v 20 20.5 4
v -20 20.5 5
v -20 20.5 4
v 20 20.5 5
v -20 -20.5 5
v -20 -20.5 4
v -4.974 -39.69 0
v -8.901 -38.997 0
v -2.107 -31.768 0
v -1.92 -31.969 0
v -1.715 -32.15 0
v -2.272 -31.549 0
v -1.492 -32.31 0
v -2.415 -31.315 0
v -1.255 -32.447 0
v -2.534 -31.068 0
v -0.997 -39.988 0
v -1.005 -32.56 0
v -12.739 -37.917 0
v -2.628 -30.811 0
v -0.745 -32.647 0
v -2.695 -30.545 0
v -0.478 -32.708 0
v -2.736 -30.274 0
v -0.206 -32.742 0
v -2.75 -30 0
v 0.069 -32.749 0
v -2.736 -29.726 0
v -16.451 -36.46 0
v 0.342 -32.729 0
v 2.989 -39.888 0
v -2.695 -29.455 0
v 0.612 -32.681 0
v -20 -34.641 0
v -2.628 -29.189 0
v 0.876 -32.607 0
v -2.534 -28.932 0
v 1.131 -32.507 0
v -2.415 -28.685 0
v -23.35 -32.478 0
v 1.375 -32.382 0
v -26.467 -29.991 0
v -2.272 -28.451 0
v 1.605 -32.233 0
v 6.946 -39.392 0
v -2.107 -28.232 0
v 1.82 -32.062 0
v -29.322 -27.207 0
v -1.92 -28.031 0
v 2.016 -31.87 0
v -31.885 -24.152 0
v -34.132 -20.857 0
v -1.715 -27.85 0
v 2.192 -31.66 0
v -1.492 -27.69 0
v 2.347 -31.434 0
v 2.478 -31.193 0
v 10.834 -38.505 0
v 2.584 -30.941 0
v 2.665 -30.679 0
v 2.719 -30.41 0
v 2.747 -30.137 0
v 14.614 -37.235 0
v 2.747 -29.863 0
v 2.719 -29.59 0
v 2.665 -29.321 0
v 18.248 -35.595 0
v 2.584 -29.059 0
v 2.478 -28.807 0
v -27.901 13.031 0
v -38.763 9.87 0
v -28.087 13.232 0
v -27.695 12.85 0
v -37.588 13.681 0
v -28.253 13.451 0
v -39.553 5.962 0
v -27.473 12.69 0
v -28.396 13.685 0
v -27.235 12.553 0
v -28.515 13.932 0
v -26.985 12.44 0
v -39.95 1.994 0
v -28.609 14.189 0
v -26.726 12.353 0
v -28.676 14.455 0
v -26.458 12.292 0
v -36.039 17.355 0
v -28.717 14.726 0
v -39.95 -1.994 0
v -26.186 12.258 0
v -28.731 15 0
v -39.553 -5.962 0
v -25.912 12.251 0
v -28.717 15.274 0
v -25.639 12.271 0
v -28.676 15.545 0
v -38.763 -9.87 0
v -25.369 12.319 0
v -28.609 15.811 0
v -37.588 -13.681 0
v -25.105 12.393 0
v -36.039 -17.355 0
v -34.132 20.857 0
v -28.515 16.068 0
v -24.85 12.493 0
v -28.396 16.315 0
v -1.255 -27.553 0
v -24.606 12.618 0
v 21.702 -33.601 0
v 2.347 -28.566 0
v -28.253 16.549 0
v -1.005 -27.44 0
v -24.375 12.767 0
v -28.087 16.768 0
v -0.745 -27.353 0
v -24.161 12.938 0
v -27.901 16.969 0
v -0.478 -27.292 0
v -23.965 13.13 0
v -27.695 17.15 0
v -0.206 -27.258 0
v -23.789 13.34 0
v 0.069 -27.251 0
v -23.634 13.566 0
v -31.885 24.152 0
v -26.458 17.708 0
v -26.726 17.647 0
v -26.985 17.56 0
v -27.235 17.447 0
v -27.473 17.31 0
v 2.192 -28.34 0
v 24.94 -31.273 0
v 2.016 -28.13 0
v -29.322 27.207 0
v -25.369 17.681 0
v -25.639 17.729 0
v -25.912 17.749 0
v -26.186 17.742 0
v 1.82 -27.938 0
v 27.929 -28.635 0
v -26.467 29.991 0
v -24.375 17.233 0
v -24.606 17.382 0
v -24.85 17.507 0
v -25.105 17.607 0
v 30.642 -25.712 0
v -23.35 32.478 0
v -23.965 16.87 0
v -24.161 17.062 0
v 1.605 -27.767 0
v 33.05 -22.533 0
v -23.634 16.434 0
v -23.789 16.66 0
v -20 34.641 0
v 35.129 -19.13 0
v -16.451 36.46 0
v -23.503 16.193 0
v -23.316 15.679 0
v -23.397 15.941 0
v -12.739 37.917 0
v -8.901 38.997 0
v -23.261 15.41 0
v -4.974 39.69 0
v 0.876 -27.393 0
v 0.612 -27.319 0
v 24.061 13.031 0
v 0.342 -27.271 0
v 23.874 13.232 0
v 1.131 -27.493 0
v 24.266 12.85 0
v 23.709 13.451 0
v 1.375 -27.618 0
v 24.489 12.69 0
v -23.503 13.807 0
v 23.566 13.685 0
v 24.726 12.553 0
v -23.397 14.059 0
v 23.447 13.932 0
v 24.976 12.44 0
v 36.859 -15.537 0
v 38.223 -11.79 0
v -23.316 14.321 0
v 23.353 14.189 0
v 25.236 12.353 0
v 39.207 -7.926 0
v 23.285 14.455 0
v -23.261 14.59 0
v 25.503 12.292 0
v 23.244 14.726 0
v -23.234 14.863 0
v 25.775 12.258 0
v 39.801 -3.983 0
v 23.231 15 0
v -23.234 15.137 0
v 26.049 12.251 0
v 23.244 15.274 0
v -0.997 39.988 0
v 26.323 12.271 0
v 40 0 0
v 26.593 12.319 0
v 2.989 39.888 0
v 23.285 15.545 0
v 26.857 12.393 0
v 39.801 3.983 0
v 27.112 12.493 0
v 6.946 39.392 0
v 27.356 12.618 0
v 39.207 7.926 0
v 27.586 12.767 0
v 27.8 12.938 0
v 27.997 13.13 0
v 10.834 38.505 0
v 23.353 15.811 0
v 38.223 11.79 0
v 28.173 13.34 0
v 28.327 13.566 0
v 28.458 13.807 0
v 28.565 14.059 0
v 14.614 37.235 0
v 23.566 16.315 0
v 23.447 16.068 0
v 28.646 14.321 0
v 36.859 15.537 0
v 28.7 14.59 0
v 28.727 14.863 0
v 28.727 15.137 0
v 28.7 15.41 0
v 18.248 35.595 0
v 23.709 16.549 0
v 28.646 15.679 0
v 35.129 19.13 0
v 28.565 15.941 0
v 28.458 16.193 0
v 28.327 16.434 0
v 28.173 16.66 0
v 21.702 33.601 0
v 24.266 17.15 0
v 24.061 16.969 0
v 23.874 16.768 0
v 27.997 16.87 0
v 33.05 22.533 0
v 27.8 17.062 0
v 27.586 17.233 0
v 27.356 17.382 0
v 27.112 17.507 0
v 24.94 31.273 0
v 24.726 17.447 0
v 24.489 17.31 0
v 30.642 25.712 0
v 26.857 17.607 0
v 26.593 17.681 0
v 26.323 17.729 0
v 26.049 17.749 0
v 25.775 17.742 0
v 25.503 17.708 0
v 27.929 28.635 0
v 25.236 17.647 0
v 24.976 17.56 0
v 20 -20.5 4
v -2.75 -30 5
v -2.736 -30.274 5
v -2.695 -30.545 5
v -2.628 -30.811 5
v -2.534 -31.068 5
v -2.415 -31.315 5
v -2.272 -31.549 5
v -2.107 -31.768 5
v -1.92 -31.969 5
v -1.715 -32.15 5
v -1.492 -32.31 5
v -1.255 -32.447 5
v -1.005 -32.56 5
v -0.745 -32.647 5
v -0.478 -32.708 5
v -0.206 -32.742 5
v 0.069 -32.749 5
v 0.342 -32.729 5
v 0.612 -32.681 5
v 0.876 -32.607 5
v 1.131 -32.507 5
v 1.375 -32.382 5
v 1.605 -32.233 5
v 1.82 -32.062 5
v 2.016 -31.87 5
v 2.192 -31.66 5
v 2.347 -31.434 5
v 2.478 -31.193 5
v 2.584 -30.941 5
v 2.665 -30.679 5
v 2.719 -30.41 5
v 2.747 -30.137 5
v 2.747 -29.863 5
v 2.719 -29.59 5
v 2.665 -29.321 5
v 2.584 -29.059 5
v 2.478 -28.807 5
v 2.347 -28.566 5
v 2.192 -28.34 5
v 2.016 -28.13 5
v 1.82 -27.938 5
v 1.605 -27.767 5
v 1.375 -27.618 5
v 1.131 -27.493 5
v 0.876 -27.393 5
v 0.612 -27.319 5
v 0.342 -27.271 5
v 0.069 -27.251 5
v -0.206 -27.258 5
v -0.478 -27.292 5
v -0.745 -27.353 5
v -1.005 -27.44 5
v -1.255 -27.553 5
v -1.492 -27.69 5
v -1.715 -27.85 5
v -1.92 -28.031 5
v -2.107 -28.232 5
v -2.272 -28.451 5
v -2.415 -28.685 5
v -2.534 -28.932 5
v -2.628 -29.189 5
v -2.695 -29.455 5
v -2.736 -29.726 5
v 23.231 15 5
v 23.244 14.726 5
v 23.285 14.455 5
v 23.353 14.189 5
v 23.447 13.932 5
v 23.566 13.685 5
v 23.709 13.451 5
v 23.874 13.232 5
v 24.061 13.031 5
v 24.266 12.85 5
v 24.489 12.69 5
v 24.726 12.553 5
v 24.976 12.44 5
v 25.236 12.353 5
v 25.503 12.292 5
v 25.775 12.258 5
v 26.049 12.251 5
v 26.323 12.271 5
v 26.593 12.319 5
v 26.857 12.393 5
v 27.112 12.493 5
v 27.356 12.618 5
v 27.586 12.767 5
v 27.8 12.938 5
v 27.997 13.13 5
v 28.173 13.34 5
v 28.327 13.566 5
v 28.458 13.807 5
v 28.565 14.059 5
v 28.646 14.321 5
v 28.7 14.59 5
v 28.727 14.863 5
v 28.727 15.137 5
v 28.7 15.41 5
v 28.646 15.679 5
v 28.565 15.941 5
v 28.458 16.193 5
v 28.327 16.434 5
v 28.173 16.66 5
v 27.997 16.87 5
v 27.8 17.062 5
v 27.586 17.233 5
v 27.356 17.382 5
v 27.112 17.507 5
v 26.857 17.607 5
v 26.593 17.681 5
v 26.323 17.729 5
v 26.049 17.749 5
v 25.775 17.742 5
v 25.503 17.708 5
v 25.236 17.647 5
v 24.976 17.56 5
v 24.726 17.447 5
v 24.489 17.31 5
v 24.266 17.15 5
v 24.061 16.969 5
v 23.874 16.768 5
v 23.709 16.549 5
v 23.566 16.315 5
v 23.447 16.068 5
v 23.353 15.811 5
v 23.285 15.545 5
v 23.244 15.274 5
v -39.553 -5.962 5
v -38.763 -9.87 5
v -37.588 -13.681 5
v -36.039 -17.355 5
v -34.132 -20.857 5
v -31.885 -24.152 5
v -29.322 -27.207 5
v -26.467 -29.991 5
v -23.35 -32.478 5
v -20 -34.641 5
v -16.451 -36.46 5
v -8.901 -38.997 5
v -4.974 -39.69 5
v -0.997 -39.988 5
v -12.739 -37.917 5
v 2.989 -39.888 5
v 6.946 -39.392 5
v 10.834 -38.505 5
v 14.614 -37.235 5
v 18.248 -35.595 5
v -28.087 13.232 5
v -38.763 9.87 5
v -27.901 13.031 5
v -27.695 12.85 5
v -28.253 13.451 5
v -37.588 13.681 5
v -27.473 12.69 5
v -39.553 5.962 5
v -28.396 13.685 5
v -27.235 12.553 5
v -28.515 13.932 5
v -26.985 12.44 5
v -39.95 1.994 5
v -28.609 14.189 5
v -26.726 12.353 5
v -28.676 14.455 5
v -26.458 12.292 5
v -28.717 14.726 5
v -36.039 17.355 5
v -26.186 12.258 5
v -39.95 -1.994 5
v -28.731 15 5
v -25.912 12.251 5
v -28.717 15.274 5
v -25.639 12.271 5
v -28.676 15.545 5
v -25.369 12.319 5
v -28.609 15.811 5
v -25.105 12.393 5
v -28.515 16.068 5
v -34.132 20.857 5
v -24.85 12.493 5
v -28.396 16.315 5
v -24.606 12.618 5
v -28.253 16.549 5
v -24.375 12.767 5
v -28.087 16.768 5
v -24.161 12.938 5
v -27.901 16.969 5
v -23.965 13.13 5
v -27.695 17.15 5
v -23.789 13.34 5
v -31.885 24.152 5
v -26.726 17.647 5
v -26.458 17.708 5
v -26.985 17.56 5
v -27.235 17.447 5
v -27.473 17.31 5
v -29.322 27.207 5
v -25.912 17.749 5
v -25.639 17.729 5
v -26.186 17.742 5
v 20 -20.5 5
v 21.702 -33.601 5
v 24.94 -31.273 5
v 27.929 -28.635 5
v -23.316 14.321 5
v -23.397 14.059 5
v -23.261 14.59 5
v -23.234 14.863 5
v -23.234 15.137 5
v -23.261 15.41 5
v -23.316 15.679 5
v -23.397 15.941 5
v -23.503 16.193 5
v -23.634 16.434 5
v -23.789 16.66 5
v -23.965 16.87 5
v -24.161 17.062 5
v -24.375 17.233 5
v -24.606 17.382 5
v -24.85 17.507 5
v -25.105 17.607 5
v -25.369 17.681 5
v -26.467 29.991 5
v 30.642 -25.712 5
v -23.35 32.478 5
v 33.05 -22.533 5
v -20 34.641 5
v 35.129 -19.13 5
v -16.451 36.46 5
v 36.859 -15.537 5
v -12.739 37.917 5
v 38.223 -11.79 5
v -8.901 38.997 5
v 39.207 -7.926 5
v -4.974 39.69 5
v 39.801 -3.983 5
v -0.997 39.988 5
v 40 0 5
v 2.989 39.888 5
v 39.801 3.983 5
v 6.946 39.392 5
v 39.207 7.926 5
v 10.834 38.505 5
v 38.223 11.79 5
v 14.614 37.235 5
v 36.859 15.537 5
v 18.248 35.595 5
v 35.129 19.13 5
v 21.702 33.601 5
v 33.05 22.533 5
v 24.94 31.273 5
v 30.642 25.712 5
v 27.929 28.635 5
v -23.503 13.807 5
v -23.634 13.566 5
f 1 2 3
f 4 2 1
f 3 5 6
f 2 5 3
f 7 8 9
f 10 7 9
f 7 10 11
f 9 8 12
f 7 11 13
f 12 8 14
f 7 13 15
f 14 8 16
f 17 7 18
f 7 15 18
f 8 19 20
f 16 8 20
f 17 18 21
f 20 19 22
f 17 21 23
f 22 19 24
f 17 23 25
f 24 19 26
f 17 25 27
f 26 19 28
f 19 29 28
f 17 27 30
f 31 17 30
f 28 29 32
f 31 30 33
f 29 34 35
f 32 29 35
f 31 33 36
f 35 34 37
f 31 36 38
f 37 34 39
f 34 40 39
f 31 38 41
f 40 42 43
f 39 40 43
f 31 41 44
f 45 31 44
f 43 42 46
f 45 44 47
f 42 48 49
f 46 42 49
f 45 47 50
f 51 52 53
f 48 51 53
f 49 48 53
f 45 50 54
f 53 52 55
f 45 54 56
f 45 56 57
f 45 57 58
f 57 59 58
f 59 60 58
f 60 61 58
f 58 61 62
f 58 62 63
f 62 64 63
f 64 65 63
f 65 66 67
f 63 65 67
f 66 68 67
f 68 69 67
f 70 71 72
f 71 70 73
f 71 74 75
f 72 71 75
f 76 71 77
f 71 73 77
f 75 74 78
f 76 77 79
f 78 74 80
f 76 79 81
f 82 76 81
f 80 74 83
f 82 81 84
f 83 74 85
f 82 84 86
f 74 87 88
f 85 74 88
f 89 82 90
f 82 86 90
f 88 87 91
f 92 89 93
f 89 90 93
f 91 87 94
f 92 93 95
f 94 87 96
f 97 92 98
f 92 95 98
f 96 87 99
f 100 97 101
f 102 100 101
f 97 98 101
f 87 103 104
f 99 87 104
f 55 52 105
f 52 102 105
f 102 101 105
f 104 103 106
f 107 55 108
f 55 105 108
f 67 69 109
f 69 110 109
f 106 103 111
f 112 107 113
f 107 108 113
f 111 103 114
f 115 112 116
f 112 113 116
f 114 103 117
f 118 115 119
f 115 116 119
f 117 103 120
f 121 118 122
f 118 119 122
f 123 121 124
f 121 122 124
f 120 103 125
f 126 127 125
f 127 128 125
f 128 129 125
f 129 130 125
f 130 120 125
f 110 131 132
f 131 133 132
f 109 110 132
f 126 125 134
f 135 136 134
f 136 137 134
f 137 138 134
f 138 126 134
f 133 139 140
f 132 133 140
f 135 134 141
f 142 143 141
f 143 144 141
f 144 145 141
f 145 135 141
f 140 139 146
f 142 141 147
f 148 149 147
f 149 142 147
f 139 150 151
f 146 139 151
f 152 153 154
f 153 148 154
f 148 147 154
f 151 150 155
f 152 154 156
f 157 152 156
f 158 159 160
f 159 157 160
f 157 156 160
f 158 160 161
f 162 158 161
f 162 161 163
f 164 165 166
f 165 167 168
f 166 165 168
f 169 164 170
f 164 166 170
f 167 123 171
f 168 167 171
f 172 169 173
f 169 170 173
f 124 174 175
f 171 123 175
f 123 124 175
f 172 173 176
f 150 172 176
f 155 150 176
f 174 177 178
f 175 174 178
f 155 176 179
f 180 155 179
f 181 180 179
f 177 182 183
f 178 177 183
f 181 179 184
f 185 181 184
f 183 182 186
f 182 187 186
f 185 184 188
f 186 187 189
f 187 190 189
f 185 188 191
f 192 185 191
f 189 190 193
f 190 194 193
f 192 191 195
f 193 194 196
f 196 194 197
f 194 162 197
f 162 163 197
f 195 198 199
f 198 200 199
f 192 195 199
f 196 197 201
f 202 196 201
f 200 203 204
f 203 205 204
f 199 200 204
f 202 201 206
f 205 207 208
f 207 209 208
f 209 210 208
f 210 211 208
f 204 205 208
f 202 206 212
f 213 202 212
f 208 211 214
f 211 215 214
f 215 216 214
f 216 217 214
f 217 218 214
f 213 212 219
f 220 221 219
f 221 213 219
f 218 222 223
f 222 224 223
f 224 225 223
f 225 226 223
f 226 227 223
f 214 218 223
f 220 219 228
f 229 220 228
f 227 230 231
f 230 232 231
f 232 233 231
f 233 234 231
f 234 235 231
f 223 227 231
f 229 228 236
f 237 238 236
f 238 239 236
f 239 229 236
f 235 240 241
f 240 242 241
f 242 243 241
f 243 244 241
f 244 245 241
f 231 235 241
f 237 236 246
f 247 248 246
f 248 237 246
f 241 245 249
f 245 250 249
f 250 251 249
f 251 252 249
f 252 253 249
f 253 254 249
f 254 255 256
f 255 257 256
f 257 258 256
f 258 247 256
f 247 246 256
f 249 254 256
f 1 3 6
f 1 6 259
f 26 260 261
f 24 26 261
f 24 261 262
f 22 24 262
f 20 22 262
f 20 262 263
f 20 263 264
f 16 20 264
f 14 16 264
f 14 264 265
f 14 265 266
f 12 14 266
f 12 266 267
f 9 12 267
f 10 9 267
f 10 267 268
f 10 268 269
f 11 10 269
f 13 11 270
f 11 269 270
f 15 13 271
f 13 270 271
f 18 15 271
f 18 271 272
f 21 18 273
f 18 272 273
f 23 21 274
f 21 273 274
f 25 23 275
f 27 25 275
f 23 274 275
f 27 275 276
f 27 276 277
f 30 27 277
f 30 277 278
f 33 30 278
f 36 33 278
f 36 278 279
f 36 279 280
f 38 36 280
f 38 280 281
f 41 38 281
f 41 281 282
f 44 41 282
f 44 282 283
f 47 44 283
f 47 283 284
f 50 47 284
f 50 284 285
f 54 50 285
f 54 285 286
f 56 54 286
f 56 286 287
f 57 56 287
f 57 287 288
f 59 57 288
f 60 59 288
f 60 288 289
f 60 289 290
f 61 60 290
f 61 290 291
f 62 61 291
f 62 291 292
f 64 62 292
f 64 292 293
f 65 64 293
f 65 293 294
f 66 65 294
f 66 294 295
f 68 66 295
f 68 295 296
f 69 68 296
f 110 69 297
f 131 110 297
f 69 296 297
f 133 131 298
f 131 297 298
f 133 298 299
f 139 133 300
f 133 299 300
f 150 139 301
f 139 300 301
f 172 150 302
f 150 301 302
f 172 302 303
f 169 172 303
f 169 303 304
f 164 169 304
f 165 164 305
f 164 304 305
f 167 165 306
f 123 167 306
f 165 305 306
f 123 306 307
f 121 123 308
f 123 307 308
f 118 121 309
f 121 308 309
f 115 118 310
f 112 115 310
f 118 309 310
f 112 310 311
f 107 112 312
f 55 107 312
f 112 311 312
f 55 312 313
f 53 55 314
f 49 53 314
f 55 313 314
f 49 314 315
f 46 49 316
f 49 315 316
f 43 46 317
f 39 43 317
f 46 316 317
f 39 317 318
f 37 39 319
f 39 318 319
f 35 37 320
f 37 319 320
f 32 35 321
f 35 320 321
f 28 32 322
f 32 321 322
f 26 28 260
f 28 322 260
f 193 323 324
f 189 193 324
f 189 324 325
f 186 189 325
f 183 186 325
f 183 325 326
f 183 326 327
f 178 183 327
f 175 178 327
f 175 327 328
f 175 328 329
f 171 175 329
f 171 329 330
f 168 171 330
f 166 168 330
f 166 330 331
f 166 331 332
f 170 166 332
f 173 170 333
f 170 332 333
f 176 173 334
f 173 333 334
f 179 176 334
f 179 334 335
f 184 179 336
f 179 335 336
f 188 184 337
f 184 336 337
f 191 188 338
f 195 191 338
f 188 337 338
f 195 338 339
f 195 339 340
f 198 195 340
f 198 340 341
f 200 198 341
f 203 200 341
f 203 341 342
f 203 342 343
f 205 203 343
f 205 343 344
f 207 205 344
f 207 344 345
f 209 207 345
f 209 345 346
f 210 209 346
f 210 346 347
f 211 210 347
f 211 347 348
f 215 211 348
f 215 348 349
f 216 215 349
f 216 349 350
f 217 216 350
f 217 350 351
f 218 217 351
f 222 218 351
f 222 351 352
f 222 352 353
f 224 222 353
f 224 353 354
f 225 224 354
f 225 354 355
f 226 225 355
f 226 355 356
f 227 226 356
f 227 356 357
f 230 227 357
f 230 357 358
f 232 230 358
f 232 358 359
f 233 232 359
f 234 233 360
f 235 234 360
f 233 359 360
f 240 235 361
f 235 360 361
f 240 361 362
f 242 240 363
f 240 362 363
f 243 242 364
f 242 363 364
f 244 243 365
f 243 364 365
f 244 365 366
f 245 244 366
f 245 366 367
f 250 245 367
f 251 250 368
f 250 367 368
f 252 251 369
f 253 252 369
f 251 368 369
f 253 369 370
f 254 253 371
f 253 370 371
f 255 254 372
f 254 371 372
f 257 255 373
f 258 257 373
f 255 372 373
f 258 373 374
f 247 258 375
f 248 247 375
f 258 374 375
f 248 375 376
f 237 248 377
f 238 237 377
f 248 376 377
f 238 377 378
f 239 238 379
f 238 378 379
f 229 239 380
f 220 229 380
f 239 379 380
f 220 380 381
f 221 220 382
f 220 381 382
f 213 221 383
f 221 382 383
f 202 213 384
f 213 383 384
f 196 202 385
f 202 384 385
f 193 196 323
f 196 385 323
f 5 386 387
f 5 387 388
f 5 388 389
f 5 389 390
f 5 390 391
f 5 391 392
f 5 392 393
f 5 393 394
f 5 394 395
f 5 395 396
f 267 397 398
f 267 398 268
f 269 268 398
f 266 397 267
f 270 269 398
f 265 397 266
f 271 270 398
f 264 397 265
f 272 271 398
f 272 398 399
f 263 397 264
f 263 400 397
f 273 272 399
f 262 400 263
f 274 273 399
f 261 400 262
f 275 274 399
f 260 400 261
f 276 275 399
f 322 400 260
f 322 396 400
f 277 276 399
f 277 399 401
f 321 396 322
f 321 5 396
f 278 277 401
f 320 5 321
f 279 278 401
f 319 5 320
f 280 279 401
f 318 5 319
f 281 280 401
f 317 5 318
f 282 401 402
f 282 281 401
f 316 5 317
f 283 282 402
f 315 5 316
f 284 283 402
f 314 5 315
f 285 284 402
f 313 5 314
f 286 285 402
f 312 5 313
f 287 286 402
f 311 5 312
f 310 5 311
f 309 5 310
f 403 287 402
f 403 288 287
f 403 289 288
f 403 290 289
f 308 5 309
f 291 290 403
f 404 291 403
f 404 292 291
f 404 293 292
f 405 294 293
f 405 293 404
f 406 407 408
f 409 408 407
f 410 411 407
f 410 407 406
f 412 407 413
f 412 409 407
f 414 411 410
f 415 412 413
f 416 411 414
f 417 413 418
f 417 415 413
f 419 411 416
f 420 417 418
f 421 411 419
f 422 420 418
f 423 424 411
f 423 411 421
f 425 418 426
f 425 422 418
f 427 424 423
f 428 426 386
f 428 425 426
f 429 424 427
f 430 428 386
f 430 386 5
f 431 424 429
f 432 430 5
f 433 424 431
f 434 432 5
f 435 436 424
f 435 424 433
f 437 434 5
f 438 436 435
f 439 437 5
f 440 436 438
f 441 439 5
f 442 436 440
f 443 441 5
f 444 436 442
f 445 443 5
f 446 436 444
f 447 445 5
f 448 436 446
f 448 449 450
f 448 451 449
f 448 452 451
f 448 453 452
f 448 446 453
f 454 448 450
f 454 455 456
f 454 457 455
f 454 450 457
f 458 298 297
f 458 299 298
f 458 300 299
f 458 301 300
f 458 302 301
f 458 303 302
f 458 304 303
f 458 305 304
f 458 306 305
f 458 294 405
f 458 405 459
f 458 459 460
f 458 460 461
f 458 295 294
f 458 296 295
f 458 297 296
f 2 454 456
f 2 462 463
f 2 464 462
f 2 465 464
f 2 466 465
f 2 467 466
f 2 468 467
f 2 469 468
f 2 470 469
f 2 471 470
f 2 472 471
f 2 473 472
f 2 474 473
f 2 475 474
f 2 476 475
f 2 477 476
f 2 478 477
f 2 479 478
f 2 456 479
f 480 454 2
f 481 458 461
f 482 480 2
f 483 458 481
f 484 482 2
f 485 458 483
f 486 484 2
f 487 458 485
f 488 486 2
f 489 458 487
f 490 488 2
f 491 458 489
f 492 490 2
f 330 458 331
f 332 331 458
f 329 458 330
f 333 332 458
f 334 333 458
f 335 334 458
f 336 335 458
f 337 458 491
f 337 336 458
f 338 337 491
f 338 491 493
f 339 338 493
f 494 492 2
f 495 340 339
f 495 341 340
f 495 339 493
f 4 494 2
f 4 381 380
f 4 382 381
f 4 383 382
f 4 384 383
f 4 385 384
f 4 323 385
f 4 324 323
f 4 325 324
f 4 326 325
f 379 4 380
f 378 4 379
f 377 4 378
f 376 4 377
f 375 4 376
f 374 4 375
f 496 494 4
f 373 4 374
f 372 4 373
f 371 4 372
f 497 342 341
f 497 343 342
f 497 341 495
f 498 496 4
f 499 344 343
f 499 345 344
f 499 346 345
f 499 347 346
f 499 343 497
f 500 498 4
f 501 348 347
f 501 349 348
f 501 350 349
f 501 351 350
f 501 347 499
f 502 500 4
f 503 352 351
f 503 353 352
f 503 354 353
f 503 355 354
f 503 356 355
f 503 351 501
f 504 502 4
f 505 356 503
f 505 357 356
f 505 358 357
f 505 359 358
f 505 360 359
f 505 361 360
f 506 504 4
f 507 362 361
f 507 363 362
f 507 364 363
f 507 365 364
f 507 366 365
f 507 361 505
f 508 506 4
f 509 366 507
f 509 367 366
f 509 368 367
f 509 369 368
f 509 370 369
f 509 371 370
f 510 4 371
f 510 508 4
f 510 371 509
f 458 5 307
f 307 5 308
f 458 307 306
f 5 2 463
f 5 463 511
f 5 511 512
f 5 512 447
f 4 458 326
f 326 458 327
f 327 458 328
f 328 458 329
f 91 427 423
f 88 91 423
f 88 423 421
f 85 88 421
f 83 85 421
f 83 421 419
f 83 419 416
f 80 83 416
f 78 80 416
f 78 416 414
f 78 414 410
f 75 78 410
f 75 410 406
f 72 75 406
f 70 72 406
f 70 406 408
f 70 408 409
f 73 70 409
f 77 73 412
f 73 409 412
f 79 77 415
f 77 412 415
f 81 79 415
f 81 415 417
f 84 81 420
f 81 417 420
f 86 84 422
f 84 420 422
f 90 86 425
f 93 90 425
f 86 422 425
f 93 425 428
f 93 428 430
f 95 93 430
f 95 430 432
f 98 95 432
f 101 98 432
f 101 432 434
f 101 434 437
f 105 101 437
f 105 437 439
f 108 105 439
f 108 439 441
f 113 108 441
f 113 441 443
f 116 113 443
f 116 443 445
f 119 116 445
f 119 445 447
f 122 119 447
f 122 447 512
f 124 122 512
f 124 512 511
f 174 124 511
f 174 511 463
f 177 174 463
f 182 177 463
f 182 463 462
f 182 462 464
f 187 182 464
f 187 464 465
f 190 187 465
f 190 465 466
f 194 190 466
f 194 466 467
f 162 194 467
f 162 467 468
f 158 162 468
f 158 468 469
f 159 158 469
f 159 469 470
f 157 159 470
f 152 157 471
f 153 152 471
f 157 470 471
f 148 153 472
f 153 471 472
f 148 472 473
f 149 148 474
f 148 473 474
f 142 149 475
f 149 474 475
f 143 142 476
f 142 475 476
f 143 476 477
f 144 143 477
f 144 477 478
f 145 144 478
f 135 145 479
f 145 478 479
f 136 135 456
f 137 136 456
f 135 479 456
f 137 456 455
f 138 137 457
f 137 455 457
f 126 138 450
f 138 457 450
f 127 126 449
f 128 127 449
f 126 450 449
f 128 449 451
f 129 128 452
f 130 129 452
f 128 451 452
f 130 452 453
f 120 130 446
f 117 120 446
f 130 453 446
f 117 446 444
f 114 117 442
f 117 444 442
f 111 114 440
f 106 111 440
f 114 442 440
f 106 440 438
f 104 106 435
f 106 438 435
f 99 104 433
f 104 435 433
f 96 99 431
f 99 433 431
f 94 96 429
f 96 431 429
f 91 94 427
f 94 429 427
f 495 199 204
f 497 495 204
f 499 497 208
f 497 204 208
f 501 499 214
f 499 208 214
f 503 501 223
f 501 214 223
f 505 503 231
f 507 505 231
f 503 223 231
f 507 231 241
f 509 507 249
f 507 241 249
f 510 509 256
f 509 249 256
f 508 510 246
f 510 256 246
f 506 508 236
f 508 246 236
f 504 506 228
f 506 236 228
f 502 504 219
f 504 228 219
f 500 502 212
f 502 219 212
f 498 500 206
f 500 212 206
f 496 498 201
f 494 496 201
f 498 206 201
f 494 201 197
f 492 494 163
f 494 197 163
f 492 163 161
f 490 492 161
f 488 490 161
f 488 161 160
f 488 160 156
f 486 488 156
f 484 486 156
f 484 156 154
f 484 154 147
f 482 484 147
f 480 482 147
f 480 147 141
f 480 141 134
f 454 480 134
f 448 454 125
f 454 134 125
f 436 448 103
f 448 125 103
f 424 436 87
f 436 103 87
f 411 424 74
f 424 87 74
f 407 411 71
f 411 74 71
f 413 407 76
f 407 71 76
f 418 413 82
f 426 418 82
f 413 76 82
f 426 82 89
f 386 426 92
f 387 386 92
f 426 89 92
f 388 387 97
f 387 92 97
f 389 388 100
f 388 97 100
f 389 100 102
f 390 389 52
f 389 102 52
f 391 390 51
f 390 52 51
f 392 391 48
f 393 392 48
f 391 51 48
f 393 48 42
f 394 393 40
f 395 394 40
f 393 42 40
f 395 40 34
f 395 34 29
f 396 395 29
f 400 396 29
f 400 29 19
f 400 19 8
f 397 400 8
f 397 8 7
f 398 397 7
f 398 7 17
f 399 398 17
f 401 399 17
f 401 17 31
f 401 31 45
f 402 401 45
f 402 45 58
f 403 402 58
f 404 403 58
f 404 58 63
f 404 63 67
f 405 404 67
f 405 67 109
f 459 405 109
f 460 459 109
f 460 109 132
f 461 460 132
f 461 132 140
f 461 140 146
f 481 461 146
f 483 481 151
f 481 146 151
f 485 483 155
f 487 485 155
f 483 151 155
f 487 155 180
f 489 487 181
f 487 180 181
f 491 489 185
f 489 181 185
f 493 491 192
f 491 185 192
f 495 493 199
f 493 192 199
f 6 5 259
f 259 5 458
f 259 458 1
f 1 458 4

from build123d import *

# Parameters (mm, degrees)
F0_R     = 40
F1_DEPTH = 5
F2_W     = 40
F2_H     = 41
F3_DEPTH = 1
F5_D     = 5.5
F6_DEPTH = 1


with BuildPart() as f1:
    # F0 (on Top) → F1 (new body)
    with BuildSketch(Plane.XY):
        Circle(F0_R)
    extrude(amount=F1_DEPTH)

    # F2 (on face) → F3 (cut)
    with BuildSketch(Plane.XY.offset(5)):
        Rectangle(F2_W, F2_H)
    extrude(amount=-F3_DEPTH, mode=Mode.SUBTRACT)

    # F5 (through all)
    with Locations(Plane(origin=(0, 0, 0), x_dir=(1, 0, 0), z_dir=(0, 0, -1))):
        with Locations((0, 30), (25.980762, -15), (-25.980762, -15)):
            Hole(F5_D / 2)

    # F2 (on face) → F6 (cut)
    with BuildSketch(Plane.XY.offset(5)):
        Rectangle(F2_W, F2_H)
    extrude(amount=-F6_DEPTH, mode=Mode.SUBTRACT)


solid = f1.part
